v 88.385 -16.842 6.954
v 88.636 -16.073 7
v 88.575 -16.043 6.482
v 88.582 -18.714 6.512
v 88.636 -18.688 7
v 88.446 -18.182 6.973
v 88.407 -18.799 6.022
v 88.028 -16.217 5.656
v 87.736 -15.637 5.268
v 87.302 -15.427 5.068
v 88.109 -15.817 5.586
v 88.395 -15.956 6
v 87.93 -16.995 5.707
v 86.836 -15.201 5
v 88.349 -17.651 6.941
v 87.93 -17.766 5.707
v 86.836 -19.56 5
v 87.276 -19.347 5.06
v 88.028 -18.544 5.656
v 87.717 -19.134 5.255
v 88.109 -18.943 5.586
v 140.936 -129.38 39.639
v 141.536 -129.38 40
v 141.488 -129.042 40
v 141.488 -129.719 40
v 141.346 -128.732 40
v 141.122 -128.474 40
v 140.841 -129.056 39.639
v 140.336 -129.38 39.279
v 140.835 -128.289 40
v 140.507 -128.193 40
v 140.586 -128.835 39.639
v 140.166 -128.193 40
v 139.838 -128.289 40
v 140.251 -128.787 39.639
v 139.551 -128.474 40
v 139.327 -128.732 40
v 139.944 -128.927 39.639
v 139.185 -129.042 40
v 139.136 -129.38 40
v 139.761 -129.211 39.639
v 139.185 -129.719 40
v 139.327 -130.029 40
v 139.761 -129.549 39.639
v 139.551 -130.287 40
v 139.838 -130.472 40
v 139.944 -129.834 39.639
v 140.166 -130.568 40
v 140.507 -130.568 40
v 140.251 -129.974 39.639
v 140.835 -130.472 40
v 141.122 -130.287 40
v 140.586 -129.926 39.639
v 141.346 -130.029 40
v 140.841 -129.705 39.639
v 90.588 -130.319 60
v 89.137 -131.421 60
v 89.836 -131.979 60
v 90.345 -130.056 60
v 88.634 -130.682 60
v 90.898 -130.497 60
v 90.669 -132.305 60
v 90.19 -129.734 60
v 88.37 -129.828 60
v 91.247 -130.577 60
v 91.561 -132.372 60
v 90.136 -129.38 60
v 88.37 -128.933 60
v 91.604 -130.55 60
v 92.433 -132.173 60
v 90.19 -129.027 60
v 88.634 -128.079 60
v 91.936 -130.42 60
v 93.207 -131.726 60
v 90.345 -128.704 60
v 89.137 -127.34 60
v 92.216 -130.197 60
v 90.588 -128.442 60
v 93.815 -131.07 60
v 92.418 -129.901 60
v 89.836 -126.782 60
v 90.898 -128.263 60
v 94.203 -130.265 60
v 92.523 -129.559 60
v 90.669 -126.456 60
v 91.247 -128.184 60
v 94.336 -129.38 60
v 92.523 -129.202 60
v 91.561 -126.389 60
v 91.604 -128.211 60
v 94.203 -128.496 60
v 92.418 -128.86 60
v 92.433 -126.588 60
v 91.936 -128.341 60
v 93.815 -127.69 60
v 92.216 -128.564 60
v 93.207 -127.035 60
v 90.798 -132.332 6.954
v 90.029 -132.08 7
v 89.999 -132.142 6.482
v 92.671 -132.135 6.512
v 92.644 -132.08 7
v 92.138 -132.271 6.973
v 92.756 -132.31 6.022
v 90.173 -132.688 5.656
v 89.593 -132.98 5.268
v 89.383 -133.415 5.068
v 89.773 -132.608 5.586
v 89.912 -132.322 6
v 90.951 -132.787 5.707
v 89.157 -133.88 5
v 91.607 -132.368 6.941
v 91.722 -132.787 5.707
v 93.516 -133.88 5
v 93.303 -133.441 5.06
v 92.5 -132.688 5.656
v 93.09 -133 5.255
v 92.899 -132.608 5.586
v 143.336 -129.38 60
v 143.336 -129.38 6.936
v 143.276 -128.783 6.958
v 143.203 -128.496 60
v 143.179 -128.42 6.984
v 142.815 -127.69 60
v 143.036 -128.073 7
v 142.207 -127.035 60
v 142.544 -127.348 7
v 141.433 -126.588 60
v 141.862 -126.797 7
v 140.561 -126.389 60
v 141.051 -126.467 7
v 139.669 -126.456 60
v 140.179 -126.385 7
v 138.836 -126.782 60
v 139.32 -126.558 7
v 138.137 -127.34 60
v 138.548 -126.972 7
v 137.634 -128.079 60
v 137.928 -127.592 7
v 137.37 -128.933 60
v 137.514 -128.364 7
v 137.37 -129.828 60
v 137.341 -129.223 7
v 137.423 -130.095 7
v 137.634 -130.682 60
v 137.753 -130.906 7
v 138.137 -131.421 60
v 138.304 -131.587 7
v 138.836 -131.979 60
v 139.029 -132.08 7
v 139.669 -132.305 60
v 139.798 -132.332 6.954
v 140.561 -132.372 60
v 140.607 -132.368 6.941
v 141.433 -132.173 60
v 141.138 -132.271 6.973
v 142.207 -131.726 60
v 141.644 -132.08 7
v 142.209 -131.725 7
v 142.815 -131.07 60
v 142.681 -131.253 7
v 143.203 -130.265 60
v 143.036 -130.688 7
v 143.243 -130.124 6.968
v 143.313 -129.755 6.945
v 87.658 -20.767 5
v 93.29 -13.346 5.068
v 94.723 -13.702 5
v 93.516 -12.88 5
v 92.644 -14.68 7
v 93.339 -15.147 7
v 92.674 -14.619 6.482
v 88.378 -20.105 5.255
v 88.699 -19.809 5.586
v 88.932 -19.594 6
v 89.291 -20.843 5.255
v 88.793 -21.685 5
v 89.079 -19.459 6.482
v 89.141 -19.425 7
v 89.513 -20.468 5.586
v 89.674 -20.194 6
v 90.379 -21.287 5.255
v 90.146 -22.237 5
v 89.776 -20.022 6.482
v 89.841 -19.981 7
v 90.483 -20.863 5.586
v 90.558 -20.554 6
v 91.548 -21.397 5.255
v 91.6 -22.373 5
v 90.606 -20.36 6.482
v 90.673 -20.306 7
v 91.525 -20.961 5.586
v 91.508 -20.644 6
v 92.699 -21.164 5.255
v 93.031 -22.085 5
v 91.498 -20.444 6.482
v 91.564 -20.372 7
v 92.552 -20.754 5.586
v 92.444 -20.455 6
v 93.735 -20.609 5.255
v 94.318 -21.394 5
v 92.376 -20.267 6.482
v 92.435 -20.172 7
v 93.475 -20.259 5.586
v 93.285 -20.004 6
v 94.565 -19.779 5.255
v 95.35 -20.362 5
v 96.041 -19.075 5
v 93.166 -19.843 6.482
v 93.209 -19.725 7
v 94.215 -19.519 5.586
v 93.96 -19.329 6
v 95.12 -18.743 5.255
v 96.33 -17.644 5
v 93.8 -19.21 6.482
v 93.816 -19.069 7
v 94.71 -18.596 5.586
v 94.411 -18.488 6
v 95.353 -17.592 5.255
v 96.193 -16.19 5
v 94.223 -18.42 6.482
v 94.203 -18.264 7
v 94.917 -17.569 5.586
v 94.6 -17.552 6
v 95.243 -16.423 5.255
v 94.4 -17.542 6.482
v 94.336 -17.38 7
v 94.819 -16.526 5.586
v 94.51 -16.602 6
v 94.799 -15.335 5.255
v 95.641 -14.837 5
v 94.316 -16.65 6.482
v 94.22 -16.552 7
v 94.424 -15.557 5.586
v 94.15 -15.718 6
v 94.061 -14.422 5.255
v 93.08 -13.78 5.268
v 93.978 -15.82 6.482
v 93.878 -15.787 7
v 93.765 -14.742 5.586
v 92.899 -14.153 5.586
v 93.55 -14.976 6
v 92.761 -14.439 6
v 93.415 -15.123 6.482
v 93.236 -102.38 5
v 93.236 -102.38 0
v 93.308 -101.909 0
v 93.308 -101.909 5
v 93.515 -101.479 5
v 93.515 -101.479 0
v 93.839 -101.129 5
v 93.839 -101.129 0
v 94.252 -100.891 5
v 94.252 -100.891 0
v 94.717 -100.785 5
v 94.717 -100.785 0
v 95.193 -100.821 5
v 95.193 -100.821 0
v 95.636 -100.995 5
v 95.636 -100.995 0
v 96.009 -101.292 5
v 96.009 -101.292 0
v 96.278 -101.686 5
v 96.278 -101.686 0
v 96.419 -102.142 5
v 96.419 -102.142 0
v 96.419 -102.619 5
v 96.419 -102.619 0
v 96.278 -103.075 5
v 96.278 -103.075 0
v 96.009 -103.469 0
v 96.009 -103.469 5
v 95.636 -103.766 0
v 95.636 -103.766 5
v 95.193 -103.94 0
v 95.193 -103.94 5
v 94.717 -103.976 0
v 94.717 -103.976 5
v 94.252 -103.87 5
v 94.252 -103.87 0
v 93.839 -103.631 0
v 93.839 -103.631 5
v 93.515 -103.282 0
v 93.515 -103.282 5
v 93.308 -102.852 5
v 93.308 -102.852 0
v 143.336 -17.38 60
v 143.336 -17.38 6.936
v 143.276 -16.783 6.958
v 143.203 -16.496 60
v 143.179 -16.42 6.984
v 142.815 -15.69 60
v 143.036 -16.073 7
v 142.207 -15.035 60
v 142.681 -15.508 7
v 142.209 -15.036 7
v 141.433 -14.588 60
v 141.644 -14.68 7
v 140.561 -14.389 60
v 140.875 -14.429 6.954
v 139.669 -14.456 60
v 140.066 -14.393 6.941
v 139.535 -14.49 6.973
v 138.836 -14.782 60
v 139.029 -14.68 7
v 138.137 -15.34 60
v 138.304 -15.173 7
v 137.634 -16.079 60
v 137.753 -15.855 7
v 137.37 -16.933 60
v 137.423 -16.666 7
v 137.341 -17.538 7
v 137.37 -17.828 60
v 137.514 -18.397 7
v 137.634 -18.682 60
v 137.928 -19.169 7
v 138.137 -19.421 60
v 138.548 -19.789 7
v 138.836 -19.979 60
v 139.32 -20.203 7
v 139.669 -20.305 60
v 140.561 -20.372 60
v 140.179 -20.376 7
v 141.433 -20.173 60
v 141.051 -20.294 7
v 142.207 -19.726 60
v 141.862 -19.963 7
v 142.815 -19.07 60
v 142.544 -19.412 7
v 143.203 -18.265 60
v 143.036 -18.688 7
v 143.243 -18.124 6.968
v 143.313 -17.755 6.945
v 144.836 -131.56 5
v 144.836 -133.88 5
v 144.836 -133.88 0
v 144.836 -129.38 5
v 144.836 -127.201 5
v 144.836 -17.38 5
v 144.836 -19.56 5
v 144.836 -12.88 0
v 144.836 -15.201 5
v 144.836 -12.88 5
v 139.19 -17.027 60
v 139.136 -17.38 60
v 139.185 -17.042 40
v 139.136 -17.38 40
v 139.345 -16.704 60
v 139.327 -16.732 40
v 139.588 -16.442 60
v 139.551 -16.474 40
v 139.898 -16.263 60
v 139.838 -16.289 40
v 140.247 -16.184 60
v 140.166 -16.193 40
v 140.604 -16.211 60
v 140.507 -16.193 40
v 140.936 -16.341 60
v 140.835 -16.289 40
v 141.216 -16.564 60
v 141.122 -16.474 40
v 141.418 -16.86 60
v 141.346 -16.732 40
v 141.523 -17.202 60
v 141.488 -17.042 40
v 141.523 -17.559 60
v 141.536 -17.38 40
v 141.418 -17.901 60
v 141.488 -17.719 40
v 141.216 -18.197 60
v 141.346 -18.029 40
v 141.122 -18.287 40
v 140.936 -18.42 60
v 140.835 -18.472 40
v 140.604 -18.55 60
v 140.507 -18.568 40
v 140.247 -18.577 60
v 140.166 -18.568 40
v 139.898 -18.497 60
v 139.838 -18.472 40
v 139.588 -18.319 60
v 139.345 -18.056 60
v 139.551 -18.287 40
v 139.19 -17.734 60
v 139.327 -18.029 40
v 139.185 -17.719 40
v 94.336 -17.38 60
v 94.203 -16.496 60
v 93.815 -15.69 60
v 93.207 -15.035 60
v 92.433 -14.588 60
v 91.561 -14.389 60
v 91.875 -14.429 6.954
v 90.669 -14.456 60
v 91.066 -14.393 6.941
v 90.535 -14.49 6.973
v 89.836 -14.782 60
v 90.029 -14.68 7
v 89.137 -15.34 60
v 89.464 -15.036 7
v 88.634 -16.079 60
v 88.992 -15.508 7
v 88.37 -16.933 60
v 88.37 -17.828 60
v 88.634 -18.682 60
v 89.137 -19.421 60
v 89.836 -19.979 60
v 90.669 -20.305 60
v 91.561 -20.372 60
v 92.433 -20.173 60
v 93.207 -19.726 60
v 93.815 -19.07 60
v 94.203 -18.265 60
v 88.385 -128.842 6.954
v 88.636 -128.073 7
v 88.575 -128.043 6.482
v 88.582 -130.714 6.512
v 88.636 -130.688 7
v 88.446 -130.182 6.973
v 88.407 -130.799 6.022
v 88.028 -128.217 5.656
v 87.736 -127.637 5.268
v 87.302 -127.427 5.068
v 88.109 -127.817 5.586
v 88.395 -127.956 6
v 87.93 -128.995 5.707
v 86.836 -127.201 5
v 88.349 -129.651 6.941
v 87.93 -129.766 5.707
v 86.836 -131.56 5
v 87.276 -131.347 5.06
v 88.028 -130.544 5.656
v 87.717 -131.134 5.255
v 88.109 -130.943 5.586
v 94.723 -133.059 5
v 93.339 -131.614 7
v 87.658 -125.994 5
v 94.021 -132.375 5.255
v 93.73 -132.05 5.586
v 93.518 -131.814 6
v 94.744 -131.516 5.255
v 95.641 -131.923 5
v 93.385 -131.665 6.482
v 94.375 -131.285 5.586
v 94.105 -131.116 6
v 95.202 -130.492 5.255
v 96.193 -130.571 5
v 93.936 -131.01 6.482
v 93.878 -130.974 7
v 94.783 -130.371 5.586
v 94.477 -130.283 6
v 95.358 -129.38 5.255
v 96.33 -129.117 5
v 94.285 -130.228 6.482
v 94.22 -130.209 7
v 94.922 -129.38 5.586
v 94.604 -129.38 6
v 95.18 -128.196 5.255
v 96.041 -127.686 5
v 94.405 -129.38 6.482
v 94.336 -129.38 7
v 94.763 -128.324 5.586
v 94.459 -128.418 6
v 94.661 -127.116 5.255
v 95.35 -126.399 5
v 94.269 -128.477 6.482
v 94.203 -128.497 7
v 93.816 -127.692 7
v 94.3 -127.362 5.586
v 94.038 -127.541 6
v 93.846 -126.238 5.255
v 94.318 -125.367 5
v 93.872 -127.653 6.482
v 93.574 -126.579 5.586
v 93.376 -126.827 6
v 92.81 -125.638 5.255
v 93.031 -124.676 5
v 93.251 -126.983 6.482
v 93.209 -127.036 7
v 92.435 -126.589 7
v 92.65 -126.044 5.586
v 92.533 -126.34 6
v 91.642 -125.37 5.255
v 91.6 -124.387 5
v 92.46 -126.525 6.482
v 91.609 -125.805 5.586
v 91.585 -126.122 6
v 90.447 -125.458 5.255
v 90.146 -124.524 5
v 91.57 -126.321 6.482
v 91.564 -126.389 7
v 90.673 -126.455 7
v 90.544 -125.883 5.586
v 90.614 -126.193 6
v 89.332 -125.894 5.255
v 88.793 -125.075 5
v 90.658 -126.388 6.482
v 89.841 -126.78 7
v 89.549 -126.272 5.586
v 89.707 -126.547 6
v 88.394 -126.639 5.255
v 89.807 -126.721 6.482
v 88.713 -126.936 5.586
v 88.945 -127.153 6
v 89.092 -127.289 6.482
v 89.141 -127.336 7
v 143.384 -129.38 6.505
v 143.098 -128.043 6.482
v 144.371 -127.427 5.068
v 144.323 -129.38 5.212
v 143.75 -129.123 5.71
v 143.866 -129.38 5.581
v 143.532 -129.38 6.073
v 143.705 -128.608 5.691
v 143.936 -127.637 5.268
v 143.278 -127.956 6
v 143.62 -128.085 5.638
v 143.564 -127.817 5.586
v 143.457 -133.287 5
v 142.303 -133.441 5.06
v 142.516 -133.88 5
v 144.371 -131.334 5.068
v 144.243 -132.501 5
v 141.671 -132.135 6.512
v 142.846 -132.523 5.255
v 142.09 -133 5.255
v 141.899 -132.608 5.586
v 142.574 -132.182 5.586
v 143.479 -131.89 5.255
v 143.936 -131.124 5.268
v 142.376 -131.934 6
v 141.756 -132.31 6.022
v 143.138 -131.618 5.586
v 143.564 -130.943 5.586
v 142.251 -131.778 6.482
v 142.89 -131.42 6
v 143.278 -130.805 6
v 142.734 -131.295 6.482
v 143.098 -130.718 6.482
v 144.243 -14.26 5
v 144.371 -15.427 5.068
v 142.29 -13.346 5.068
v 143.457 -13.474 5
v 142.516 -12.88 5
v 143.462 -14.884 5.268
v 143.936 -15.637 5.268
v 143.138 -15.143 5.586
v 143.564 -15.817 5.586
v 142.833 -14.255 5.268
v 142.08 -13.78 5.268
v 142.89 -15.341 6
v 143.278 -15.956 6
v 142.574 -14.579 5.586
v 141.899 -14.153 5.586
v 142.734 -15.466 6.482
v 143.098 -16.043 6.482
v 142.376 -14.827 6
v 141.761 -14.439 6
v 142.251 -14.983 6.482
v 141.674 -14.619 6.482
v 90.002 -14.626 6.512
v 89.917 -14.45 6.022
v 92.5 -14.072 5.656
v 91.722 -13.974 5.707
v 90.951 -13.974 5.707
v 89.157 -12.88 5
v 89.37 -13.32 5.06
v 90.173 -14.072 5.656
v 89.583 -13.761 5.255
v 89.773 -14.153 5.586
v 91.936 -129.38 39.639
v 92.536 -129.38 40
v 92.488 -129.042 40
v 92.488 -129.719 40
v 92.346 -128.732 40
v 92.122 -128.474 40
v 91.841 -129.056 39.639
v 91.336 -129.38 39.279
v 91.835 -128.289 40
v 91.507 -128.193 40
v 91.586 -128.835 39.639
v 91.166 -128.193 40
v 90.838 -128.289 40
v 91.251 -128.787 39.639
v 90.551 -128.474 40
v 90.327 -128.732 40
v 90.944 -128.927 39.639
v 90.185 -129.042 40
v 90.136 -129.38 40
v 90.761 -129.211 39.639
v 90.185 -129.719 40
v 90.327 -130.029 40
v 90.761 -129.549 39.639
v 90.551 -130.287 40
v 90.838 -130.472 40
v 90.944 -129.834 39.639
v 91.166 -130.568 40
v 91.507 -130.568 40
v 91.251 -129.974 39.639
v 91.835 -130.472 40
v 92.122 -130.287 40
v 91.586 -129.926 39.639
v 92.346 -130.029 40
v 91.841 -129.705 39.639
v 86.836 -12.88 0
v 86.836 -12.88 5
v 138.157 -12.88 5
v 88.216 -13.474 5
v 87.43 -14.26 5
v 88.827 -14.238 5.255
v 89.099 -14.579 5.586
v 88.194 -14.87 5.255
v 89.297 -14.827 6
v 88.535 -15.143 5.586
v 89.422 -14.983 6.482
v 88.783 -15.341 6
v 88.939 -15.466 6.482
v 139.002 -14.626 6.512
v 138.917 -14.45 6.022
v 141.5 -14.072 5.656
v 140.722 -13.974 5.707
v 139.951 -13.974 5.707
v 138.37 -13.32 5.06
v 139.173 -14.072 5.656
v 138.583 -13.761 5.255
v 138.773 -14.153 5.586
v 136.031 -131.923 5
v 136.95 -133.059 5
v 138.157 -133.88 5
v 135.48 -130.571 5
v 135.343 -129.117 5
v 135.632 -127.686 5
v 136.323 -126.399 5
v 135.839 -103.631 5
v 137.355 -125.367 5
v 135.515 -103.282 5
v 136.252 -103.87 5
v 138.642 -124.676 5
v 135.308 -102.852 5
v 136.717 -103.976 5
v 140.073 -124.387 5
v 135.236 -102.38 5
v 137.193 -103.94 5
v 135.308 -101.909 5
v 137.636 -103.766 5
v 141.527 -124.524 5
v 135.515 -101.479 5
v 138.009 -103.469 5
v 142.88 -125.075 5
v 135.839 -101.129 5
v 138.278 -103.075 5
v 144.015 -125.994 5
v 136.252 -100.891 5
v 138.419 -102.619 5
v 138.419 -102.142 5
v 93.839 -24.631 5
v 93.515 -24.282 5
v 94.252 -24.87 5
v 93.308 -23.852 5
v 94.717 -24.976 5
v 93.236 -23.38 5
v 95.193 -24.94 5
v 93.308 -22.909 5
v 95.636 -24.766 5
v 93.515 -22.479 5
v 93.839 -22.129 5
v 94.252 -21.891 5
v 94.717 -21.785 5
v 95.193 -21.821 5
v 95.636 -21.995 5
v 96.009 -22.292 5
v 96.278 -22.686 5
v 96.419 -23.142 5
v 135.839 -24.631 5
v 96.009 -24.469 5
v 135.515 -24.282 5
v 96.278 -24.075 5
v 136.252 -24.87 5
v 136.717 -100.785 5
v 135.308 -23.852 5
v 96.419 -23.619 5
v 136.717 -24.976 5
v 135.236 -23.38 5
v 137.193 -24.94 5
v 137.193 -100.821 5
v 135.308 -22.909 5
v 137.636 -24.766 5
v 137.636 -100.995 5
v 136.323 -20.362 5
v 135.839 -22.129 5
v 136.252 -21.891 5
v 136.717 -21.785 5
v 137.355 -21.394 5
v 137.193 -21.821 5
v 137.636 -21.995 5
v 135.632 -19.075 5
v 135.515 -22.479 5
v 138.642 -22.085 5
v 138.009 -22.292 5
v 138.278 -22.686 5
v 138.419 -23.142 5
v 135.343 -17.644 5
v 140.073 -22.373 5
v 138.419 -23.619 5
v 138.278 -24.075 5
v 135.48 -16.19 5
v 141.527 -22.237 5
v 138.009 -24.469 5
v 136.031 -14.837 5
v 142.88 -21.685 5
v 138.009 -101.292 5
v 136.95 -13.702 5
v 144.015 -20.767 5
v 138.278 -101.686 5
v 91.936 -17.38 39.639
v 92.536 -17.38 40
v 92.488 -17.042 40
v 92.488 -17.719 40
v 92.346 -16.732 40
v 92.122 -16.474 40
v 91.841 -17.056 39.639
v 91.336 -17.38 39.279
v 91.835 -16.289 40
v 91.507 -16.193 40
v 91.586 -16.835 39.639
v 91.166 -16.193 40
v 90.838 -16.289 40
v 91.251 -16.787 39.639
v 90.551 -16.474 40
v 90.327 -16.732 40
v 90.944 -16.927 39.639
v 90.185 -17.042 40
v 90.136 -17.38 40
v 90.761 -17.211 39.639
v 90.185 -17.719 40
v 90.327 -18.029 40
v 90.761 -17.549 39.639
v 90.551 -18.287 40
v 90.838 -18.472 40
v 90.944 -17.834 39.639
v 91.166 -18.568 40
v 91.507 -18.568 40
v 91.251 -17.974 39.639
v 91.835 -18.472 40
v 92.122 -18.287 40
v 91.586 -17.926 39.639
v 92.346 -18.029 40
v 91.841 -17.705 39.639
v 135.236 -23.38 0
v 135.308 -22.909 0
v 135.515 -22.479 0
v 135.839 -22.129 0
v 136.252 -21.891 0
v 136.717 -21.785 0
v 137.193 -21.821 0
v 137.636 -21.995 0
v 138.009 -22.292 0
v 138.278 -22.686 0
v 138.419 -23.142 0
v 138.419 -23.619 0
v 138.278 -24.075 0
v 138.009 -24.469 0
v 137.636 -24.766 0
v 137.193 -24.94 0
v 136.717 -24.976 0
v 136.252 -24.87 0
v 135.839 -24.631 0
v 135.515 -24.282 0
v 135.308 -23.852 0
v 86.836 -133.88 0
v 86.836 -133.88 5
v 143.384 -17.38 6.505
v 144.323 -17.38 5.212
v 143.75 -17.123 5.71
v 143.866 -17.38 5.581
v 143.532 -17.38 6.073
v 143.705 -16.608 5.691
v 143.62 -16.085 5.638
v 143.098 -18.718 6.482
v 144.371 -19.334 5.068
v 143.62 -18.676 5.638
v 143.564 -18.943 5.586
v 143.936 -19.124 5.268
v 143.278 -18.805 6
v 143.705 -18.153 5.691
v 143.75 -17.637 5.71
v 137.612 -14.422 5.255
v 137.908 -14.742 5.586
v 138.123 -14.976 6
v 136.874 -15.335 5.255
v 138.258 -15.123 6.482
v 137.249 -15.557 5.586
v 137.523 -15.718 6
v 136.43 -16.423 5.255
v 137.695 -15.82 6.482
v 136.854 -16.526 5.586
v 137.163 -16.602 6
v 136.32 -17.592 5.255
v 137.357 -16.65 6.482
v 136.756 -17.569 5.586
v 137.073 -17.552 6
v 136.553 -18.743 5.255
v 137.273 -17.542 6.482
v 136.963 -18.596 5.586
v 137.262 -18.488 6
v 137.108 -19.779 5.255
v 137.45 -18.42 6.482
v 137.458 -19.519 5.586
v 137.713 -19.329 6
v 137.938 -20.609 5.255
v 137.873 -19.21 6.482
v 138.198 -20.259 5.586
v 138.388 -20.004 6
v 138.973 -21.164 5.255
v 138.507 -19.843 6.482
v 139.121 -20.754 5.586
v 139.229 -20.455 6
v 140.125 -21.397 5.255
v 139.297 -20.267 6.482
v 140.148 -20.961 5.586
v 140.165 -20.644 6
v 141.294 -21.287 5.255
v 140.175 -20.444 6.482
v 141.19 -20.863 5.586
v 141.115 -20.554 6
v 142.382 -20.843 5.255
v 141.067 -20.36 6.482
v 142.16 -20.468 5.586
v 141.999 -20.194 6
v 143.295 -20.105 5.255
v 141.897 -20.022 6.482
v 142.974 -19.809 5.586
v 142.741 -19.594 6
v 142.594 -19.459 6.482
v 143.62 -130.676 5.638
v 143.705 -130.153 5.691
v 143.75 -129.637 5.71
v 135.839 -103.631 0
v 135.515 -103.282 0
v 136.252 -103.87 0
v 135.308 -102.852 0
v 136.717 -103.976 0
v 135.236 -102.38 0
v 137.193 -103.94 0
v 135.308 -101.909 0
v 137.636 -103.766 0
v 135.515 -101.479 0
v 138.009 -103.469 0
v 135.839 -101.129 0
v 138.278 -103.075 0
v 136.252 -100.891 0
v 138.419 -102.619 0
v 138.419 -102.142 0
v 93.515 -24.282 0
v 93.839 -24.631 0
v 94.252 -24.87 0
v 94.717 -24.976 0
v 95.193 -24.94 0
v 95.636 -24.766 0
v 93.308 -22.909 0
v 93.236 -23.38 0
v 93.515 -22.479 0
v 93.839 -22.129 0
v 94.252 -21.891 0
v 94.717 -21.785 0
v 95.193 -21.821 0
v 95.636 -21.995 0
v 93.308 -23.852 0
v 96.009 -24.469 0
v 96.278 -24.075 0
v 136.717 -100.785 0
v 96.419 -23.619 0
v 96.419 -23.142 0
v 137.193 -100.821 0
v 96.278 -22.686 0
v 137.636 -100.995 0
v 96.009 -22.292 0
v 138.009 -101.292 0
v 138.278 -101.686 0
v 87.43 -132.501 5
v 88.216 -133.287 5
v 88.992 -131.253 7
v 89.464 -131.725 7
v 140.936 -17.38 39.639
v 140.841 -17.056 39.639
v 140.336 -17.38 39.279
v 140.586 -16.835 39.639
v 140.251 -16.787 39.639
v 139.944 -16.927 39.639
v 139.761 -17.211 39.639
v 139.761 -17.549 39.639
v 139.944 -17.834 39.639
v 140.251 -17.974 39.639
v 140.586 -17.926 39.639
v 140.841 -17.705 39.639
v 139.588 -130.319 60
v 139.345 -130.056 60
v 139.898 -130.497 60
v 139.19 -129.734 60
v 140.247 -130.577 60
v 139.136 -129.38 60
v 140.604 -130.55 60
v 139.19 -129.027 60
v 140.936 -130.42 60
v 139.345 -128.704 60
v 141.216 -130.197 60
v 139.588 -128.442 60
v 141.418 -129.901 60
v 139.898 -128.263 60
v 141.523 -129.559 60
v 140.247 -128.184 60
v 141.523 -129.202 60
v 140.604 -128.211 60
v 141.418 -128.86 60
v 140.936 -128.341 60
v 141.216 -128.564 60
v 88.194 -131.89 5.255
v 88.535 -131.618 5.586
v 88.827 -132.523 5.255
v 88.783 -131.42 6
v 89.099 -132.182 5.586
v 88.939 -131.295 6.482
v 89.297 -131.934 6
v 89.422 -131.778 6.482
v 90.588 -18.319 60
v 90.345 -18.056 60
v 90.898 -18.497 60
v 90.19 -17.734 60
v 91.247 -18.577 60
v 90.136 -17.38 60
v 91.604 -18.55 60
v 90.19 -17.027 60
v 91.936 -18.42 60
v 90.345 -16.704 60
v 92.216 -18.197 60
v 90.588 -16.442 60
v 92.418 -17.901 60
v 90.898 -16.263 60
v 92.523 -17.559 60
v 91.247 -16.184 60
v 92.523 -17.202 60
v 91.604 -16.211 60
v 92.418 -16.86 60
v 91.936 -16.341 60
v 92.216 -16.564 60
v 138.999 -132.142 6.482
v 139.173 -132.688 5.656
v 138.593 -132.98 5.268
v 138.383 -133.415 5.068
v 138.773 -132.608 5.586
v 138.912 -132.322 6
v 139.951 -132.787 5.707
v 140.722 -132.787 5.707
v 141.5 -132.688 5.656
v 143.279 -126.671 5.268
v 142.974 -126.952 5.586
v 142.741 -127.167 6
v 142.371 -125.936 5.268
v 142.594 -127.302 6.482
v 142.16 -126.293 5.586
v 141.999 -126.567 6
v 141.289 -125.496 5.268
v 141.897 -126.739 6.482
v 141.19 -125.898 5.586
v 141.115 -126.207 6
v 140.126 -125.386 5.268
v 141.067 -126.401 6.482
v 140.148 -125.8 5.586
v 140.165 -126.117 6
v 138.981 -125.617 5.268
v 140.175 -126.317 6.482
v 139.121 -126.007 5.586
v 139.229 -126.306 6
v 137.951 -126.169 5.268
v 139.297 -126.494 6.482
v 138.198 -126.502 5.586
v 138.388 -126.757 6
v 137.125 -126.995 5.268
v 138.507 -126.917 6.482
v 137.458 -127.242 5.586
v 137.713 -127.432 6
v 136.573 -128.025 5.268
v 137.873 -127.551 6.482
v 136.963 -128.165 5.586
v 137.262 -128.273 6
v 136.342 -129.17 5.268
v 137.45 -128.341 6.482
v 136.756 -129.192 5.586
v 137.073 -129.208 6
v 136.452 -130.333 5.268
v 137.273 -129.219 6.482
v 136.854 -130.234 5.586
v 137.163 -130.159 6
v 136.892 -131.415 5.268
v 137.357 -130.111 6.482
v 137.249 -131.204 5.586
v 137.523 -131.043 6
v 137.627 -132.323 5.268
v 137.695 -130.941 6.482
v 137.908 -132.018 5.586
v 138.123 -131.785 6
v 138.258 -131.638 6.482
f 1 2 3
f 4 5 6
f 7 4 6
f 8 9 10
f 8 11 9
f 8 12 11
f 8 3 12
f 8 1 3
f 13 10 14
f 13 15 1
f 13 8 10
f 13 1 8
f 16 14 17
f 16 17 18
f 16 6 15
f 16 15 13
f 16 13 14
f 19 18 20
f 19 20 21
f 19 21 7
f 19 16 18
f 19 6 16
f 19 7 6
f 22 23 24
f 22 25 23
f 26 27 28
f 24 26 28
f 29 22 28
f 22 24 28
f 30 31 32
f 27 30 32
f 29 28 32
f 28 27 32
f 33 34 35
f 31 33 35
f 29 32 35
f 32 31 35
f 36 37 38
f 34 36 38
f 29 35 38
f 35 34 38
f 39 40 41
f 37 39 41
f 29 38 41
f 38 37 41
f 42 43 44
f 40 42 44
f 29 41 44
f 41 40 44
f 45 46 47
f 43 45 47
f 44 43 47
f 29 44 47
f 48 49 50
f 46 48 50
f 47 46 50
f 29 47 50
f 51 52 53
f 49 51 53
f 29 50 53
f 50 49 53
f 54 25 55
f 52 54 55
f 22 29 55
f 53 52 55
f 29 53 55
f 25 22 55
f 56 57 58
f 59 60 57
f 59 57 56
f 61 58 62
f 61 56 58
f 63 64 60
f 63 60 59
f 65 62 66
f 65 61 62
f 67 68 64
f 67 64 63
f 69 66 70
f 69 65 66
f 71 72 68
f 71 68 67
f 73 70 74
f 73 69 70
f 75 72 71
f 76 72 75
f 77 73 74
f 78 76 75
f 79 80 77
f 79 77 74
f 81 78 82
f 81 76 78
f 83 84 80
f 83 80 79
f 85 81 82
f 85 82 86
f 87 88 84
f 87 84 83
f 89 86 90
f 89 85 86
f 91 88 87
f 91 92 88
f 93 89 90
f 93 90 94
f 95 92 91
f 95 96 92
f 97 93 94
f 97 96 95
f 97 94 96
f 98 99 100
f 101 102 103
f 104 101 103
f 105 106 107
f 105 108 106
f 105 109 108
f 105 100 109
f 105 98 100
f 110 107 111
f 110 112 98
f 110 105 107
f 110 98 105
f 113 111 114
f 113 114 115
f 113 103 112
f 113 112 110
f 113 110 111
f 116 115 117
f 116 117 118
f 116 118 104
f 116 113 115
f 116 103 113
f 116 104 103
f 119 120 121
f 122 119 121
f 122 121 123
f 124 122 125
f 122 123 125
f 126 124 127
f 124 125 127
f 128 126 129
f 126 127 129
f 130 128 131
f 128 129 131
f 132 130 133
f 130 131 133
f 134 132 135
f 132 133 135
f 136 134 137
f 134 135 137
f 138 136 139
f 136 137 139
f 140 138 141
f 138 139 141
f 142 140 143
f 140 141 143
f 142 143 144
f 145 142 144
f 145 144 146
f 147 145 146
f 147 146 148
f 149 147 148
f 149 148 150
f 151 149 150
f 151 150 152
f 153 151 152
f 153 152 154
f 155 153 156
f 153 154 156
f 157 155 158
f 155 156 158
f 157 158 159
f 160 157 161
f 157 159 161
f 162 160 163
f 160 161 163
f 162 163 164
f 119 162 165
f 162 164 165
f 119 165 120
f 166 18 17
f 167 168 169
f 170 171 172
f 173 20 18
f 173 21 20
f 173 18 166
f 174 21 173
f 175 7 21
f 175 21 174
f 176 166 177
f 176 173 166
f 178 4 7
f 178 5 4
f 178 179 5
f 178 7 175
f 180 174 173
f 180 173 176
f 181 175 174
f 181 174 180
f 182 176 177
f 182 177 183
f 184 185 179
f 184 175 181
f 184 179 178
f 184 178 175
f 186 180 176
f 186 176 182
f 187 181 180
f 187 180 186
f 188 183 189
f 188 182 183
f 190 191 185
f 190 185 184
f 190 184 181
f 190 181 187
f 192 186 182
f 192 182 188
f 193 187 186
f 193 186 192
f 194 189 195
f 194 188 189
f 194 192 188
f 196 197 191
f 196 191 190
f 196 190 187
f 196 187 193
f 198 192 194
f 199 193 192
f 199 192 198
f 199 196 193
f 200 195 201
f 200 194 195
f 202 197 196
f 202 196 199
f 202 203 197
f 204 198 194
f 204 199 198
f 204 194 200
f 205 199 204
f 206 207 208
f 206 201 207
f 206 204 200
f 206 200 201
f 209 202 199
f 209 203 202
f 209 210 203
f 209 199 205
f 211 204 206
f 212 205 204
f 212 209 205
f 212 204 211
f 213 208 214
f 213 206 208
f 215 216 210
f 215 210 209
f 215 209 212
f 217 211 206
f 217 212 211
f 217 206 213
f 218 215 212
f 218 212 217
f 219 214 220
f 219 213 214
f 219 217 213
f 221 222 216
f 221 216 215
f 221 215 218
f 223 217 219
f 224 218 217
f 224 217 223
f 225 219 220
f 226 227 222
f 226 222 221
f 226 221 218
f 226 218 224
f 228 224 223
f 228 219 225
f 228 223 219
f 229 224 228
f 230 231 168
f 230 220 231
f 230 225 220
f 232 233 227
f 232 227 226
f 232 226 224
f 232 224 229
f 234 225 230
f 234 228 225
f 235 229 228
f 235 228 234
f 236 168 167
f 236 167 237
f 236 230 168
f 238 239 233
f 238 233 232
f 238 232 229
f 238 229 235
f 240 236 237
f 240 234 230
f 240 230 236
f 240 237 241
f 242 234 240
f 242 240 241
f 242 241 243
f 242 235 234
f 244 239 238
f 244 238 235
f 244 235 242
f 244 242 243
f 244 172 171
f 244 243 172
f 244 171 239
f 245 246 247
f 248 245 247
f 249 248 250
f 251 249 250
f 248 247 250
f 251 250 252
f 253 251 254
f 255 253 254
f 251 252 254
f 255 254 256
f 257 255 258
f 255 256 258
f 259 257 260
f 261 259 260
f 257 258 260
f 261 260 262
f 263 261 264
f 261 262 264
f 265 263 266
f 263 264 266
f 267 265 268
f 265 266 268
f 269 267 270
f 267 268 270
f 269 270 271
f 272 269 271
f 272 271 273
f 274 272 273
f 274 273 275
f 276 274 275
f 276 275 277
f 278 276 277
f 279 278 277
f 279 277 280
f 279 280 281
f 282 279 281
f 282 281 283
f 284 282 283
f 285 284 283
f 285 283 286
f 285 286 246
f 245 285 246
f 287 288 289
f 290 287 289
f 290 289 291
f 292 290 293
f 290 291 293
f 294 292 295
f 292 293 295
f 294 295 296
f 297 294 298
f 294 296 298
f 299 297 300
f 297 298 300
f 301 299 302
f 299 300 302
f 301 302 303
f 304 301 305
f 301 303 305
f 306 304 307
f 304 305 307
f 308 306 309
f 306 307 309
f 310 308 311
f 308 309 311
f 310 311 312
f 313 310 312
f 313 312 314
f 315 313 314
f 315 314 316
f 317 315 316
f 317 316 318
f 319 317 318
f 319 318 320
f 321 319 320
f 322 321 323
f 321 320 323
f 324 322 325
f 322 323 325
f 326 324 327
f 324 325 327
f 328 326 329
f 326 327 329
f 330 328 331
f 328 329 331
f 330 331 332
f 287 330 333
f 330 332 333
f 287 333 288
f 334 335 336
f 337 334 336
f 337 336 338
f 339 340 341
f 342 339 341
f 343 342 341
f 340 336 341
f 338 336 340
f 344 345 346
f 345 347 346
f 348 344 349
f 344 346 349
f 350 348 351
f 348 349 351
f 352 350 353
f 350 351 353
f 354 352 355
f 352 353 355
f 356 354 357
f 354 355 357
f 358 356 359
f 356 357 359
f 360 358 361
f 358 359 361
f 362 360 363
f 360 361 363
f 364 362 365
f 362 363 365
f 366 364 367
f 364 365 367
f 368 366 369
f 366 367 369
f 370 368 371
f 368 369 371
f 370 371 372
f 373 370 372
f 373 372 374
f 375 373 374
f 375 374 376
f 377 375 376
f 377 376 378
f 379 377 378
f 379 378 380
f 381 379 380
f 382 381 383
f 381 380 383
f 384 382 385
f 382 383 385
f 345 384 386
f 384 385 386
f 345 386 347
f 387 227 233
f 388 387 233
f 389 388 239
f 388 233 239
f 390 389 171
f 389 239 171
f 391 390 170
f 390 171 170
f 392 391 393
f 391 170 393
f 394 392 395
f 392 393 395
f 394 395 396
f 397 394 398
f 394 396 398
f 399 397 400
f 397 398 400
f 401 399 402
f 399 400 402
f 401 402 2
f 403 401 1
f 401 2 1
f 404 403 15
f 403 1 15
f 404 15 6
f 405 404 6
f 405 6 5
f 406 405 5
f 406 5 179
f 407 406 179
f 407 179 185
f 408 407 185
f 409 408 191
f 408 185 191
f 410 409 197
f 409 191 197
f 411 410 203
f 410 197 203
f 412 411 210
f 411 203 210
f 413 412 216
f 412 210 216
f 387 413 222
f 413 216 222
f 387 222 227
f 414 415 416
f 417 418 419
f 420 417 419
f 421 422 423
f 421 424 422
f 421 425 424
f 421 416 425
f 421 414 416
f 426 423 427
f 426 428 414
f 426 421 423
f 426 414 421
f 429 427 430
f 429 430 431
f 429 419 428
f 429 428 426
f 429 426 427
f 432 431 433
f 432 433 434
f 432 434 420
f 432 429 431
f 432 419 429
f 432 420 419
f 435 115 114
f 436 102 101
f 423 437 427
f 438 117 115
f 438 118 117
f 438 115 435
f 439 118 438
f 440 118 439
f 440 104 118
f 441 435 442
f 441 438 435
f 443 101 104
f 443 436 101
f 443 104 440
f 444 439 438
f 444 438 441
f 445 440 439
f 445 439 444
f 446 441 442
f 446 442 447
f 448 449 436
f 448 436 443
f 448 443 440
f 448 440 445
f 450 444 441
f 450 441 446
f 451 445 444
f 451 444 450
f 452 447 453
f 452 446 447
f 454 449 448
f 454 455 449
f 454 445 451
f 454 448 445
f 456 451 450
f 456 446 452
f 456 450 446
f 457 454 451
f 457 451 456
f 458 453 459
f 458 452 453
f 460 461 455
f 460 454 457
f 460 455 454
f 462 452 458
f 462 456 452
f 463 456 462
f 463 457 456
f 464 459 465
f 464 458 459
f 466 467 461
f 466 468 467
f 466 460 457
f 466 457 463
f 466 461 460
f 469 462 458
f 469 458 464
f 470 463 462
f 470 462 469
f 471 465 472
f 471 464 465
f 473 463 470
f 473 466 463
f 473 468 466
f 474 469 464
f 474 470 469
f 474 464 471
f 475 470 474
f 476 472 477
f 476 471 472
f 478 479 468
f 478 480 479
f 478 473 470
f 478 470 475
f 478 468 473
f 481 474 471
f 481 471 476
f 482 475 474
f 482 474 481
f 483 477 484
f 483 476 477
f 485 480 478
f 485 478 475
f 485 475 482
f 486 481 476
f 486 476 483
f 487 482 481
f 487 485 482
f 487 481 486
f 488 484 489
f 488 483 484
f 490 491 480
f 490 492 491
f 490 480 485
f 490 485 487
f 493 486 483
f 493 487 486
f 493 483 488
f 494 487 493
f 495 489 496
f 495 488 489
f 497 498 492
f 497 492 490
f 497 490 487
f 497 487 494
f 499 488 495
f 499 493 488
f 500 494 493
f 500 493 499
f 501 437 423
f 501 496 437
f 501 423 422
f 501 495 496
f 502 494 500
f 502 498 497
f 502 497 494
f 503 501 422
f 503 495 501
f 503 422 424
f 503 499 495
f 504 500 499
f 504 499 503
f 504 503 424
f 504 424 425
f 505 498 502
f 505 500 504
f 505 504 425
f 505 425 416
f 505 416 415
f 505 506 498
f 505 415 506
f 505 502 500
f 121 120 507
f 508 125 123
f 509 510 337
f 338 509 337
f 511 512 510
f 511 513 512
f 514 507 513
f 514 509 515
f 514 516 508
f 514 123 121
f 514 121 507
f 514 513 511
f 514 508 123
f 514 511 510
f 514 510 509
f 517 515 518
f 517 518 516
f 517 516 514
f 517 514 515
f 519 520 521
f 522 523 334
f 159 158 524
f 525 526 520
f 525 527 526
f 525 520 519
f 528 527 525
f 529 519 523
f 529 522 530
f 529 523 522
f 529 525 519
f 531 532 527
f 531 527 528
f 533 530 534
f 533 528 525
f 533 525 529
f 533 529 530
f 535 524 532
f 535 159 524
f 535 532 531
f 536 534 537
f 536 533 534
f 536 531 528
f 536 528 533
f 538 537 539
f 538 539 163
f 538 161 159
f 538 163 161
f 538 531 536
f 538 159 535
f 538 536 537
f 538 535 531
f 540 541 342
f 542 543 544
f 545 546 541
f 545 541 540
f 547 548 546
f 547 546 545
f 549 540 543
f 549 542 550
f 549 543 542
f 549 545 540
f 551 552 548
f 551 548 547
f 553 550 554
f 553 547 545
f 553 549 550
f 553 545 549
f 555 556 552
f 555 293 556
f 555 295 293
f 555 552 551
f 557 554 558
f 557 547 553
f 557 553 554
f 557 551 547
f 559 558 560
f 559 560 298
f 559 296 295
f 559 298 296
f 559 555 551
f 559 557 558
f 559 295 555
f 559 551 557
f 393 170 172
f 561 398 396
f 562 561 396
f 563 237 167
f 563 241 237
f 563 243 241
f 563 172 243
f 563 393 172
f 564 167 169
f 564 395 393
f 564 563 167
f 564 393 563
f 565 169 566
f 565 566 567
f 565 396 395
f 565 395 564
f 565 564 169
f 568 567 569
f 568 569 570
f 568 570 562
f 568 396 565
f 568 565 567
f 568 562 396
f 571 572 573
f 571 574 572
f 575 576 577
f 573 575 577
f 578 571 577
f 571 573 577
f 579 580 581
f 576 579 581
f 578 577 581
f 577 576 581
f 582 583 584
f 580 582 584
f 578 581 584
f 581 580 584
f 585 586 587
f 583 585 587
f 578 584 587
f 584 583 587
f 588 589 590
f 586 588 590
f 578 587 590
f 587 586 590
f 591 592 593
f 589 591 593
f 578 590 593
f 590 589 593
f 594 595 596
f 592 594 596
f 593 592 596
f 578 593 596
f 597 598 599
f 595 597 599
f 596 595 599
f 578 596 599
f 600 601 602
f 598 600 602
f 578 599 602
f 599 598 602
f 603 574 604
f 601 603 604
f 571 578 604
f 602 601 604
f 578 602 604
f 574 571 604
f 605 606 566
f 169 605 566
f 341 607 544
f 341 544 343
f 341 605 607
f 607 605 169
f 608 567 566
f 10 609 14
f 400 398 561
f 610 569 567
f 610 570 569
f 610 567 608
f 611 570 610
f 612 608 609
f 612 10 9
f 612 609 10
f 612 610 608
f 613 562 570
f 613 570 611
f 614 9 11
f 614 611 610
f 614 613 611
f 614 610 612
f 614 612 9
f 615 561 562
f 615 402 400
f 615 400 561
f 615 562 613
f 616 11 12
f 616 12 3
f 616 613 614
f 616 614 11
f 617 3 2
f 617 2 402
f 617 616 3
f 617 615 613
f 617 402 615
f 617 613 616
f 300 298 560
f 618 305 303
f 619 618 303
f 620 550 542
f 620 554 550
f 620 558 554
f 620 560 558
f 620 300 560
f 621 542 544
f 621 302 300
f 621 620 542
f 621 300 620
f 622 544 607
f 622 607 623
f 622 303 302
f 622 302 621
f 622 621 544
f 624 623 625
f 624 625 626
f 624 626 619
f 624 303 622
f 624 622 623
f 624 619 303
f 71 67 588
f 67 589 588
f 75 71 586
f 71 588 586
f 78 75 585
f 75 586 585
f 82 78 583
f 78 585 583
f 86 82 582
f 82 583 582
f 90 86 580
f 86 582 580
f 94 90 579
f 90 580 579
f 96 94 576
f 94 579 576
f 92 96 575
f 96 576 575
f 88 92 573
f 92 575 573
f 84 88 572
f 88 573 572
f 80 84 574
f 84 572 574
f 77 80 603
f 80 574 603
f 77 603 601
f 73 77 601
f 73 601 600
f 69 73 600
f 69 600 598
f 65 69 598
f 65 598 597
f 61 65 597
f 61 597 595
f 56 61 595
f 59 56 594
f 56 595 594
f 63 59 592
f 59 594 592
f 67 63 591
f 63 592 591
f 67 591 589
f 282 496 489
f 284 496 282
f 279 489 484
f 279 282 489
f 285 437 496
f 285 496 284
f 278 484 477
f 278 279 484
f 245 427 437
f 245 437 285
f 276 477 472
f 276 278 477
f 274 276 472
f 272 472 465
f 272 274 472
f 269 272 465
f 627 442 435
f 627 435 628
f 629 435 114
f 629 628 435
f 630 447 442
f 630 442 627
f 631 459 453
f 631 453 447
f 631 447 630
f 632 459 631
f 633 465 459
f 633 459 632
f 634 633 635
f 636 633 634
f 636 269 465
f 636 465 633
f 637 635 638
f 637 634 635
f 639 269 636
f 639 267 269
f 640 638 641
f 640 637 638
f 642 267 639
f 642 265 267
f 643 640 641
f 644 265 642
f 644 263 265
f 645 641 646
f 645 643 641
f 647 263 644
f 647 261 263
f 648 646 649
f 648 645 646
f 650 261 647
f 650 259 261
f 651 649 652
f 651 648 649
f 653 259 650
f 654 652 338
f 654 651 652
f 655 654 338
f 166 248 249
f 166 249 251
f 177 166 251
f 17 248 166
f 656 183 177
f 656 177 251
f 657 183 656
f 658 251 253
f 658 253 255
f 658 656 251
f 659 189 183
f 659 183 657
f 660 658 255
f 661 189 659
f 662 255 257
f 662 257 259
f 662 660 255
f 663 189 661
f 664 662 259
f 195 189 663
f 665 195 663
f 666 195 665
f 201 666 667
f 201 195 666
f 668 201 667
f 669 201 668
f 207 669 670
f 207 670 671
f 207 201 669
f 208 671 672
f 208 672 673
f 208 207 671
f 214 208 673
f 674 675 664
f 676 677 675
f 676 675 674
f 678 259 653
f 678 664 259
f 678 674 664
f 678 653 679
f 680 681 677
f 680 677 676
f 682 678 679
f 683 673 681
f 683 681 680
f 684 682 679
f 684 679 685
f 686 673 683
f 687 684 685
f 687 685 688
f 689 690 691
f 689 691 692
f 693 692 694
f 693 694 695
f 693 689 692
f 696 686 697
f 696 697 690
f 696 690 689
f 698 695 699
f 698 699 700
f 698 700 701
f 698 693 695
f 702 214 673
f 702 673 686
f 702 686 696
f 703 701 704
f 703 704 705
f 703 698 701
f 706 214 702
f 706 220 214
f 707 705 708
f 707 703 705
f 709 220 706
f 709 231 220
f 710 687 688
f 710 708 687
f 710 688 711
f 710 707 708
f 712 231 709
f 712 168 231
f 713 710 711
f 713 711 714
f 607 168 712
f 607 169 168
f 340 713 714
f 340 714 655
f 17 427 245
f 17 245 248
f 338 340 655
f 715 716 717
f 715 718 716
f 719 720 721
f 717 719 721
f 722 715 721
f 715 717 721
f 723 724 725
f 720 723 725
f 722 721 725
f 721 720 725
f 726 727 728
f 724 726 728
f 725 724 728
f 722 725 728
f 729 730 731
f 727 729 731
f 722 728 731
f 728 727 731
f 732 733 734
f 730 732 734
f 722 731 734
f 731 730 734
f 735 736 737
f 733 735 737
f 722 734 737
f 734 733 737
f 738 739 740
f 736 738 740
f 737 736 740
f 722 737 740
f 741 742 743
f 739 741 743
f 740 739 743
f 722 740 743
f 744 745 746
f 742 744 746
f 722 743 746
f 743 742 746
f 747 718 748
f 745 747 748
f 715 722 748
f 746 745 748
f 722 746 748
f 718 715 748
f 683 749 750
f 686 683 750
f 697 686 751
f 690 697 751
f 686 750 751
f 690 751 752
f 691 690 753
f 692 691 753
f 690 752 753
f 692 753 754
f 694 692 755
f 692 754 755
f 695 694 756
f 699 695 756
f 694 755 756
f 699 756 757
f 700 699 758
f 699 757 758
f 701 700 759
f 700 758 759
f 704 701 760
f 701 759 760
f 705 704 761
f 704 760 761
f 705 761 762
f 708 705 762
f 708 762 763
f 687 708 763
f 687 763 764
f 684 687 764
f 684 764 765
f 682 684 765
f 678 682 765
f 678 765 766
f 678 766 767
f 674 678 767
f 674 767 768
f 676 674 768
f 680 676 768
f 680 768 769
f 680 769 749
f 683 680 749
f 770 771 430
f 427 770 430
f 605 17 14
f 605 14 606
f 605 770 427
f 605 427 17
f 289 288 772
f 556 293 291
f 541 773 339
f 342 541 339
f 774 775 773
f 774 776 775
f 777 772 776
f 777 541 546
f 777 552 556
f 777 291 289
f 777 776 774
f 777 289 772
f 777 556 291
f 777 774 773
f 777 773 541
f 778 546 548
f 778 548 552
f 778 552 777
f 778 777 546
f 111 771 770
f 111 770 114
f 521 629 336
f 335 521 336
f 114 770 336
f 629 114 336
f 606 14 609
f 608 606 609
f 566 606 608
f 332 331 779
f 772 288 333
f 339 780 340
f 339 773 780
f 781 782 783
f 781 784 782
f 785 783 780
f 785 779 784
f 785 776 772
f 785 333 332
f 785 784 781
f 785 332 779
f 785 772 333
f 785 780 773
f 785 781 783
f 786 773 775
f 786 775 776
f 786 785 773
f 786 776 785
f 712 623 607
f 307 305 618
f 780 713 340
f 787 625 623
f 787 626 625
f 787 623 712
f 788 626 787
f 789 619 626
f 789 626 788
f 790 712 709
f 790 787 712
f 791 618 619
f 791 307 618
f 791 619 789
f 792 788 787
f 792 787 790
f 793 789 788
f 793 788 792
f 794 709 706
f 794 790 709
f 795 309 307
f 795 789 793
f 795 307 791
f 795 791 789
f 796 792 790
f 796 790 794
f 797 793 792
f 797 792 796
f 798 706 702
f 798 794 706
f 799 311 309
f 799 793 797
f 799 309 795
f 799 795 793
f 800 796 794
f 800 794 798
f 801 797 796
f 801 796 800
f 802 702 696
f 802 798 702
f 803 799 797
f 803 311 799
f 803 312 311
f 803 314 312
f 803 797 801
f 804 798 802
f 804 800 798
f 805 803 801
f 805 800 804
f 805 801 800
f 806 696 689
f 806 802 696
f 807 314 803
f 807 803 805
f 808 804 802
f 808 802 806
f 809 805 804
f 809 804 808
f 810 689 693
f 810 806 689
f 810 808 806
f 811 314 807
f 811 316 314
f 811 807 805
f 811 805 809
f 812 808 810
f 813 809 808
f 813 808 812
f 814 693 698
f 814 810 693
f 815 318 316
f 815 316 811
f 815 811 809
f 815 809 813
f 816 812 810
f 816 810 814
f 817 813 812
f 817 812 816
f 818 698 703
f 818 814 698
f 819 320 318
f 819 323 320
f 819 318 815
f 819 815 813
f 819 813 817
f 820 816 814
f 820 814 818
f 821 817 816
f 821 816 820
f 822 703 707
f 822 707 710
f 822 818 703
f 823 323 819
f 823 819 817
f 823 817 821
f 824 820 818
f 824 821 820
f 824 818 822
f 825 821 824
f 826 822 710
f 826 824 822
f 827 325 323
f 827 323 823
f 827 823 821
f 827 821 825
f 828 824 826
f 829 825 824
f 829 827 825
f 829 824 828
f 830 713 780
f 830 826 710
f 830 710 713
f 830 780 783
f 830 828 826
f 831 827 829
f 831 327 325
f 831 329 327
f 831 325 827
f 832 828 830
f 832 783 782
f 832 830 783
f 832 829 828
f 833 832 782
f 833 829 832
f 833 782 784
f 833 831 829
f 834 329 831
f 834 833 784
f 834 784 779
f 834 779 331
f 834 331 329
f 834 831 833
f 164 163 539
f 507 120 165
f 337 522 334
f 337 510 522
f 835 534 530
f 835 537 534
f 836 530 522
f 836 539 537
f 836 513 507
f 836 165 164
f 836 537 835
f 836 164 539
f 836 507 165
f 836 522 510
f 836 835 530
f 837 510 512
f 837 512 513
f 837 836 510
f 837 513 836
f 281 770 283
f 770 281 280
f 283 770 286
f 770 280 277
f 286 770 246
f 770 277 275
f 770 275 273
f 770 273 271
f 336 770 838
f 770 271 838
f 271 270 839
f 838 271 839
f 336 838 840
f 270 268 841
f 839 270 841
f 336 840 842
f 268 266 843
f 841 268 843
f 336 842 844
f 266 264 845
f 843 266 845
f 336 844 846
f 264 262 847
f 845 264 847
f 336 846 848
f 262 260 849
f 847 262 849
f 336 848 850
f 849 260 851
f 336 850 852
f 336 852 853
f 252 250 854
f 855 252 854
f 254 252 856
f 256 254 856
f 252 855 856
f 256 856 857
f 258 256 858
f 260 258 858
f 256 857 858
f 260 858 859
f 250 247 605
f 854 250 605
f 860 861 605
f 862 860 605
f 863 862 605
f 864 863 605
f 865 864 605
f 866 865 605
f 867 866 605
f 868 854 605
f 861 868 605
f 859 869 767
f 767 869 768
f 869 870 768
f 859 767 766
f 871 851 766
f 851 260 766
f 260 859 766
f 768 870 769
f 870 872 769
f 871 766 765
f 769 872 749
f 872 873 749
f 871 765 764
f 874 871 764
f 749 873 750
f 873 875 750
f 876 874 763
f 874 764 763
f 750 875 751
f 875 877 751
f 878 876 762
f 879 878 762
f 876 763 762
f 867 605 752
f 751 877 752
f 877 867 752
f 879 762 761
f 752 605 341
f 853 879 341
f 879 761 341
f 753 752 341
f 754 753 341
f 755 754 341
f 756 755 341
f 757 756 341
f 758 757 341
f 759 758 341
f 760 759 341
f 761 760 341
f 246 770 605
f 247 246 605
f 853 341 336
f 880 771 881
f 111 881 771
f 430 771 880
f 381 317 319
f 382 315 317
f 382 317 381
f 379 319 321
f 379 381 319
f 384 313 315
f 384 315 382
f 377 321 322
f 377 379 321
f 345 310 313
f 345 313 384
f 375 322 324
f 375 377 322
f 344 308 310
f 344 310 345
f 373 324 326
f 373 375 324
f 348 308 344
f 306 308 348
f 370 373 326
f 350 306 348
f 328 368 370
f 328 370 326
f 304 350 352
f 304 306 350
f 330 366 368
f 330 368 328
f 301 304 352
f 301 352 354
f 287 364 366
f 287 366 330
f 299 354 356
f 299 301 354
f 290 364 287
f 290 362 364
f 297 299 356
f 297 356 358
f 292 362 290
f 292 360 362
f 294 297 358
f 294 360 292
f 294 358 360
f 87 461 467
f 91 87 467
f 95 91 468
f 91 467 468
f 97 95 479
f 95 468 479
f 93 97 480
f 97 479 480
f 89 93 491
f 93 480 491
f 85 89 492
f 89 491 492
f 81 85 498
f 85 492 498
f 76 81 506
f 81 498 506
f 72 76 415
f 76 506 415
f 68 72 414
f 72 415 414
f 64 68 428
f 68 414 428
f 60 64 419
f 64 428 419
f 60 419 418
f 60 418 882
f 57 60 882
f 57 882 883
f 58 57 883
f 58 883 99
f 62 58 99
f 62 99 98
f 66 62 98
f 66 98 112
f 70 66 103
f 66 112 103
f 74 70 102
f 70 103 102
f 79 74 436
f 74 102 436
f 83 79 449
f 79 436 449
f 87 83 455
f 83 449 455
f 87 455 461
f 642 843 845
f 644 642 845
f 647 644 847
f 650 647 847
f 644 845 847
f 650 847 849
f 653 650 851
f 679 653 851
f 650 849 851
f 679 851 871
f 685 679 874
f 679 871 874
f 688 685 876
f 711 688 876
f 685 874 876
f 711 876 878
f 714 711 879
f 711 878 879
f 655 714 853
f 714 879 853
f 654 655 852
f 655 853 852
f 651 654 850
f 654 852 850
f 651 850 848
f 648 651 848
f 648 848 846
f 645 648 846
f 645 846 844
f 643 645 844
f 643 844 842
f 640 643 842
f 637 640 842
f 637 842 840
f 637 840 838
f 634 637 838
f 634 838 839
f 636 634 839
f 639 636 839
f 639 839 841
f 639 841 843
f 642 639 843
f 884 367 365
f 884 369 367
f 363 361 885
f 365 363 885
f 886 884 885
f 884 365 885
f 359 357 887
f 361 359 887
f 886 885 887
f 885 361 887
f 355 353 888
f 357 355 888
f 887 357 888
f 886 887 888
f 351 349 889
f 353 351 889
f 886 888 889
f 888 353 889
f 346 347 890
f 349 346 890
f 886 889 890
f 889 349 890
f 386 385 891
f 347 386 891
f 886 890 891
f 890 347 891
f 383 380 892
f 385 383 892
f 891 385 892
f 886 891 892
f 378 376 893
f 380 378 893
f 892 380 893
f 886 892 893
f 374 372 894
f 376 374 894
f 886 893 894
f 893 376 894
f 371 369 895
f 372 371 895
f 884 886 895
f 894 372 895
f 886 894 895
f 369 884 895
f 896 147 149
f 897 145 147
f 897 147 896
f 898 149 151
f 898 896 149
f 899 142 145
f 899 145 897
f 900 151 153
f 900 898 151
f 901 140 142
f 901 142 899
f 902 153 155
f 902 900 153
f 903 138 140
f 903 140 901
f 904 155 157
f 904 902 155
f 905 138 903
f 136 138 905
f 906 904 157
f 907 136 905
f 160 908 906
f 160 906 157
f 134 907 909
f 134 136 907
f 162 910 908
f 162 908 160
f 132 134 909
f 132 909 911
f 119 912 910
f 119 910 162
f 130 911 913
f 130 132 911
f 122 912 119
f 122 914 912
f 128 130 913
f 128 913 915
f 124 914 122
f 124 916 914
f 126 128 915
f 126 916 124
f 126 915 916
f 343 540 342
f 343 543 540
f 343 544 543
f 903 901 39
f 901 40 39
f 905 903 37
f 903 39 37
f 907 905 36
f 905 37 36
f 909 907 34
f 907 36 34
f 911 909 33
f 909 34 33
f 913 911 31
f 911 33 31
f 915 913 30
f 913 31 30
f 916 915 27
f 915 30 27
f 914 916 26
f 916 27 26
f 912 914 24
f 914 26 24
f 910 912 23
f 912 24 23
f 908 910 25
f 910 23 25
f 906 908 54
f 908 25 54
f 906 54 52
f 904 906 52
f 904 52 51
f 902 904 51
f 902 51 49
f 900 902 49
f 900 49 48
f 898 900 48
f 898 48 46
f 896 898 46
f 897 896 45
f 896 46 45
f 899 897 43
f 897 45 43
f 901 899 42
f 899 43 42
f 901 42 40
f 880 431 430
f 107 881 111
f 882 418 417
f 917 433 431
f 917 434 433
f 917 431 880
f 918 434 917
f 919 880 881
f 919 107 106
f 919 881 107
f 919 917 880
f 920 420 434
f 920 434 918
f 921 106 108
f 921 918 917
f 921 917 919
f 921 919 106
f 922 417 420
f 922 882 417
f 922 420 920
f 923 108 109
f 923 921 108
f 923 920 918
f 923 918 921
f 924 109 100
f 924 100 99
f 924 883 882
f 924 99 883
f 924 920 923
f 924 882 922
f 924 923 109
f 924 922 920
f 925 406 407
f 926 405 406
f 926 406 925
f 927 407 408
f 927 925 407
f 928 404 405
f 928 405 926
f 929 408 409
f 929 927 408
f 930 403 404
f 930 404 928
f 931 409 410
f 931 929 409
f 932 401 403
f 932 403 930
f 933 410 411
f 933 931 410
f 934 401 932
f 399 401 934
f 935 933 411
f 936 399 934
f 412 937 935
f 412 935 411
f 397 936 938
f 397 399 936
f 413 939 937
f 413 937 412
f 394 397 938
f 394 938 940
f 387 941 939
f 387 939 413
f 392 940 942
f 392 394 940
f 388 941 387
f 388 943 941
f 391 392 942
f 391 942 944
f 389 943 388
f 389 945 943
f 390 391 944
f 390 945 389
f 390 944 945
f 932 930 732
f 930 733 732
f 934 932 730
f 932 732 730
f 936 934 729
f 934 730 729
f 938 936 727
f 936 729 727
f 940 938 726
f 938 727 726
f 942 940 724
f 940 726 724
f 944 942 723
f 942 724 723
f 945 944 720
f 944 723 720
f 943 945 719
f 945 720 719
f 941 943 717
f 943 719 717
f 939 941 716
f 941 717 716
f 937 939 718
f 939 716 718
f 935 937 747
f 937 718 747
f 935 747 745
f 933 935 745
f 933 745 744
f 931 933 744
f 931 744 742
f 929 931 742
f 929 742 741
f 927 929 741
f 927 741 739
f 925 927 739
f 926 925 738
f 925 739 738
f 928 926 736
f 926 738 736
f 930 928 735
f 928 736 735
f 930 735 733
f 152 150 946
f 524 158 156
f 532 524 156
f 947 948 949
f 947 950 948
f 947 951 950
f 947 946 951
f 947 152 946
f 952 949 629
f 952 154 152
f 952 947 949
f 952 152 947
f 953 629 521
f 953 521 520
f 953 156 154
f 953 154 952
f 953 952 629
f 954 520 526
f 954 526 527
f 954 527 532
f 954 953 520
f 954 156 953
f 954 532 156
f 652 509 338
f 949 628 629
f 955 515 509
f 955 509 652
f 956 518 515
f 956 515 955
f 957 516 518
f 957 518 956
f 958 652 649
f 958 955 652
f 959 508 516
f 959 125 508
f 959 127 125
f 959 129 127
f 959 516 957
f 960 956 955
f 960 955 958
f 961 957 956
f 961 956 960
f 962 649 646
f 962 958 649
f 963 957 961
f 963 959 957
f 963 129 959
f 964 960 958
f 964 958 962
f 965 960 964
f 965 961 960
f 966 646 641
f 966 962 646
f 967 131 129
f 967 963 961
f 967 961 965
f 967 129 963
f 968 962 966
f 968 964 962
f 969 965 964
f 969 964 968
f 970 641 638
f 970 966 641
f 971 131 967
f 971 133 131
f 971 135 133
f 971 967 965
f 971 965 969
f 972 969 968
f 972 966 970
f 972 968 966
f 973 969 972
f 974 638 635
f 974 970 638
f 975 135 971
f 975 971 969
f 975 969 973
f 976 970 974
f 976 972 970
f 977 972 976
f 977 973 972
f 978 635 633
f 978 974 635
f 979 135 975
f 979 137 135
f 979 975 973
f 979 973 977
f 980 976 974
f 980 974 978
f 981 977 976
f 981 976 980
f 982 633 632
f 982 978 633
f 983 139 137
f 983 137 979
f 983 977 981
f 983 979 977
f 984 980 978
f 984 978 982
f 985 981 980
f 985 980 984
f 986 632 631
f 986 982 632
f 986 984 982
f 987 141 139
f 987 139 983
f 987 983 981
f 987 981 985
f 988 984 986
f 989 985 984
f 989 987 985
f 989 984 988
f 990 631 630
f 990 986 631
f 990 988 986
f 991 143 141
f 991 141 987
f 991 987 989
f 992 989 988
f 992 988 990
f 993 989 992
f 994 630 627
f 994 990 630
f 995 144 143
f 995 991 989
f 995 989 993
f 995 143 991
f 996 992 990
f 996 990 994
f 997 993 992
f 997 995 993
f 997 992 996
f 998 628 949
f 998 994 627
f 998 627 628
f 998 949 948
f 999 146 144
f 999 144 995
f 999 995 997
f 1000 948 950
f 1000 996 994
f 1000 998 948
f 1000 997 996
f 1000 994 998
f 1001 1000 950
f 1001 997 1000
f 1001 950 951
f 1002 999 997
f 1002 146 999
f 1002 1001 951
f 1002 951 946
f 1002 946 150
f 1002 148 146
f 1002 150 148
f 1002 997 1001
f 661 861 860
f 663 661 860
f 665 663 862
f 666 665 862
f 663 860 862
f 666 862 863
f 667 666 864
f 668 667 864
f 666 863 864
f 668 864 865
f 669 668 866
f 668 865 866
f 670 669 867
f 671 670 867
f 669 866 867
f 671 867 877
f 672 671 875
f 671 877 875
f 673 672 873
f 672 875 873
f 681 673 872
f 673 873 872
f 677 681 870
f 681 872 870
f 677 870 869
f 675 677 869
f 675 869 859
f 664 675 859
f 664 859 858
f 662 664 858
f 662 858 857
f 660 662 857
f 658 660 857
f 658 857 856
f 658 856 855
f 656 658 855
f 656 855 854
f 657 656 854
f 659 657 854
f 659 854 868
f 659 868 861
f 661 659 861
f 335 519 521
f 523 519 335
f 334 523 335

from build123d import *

# Parameters (mm, degrees)
SCHIZZO1_W                   = 58
SCHIZZO1_H                   = 121
ESTRUSIONE_ESTRUSIONE2_DEPTH = 5
TAGLIO_ESTRUSIONE1_REACH     = 7
SCHIZZO12_R                  = 1.6
SCHIZZO2_R                   = 3
ESTRUSIONE_ESTRUSIONE3_DEPTH = 55
RACCORDO1_R                  = 2
FORO_PER_VITE_M3_1_D         = 2.4
FORO_PER_VITE_M3_1_DEPTH     = 20
FORO_PER_VITE_M3_1_TIP       = 0.721032743


with BuildPart() as part:
    # Schizzo1 → Estrusione-Estrusione2 (new body)
    with BuildSketch(Plane.XY):
        with Locations((115.836484846, -73.380424615)):
            Rectangle(SCHIZZO1_W, SCHIZZO1_H)
    extrude(amount=ESTRUSIONE_ESTRUSIONE2_DEPTH)

    # Schizzo12 → Taglio-Estrusione1 (cut, up to next)
    with BuildSketch(Plane(origin=(0, 0, 0), x_dir=(-1, 0, 0), z_dir=(0, 0, -1)), mode=Mode.PRIVATE) as taglio_estrusione1_sk1:
        with Locations((-94.836484846, -102.380424615)):
            Circle(SCHIZZO12_R)
    taglio_estrusione1_tool1 = extrude(taglio_estrusione1_sk1.sketch, amount=-TAGLIO_ESTRUSIONE1_REACH, mode=Mode.PRIVATE) & part.part
    add(taglio_estrusione1_tool1.solids().sort_by_distance((94.836485, -102.380425, 0))[0], mode=Mode.SUBTRACT)
    # Schizzo12 → Taglio-Estrusione1 (cut, up to next)
    with BuildSketch(Plane(origin=(0, 0, 0), x_dir=(-1, 0, 0), z_dir=(0, 0, -1)), mode=Mode.PRIVATE) as taglio_estrusione1_sk2:
        with Locations((-136.836484846, -102.380424615)):
            Circle(SCHIZZO12_R)
    taglio_estrusione1_tool2 = extrude(taglio_estrusione1_sk2.sketch, amount=-TAGLIO_ESTRUSIONE1_REACH, mode=Mode.PRIVATE) & part.part
    add(taglio_estrusione1_tool2.solids().sort_by_distance((136.836485, -102.380425, 0))[0], mode=Mode.SUBTRACT)
    # Schizzo12 → Taglio-Estrusione1 (cut, up to next)
    with BuildSketch(Plane(origin=(0, 0, 0), x_dir=(-1, 0, 0), z_dir=(0, 0, -1)), mode=Mode.PRIVATE) as taglio_estrusione1_sk3:
        with Locations((-136.836484846, -23.380424615)):
            Circle(SCHIZZO12_R)
    taglio_estrusione1_tool3 = extrude(taglio_estrusione1_sk3.sketch, amount=-TAGLIO_ESTRUSIONE1_REACH, mode=Mode.PRIVATE) & part.part
    add(taglio_estrusione1_tool3.solids().sort_by_distance((136.836485, -23.380425, 0))[0], mode=Mode.SUBTRACT)
    # Schizzo12 → Taglio-Estrusione1 (cut, up to next)
    with BuildSketch(Plane(origin=(0, 0, 0), x_dir=(-1, 0, 0), z_dir=(0, 0, -1)), mode=Mode.PRIVATE) as taglio_estrusione1_sk4:
        with Locations((-94.836484846, -23.380424615)):
            Circle(SCHIZZO12_R)
    taglio_estrusione1_tool4 = extrude(taglio_estrusione1_sk4.sketch, amount=-TAGLIO_ESTRUSIONE1_REACH, mode=Mode.PRIVATE) & part.part
    add(taglio_estrusione1_tool4.solids().sort_by_distance((94.836485, -23.380425, 0))[0], mode=Mode.SUBTRACT)

    # Schizzo2 → Estrusione-Estrusione3 (add)
    with BuildSketch(Plane.XY.offset(5)):
        with Locations((140.336484846, -129.380424615)):
            Circle(SCHIZZO2_R)
        with Locations((91.336484846, -129.380424615)):
            Circle(SCHIZZO2_R)
        with Locations((140.336484846, -17.380424615)):
            Circle(SCHIZZO2_R)
        with Locations((91.336484846, -17.380424615)):
            Circle(SCHIZZO2_R)
    extrude(amount=ESTRUSIONE_ESTRUSIONE3_DEPTH)

    # Raccordo1
    raccordo1_edges = [part.edges().sort_by_distance(p)[0] for p in [
        (88.336484846, -129.380424615, 5),
        (137.336484846, -17.380424615, 5),
        (137.336484846, -129.380424615, 5),
        (88.336484846, -17.380424615, 5),
    ]]
    fillet(raccordo1_edges, radius=RACCORDO1_R)

    # Foro per Vite M3-1
    with Locations(Plane.XY.offset(60)):
        with Locations((140.336484846, -129.380424615), (91.336484846, -129.380424615), (91.336484846, -17.380424615), (140.336484846, -17.380424615)):
            Hole(FORO_PER_VITE_M3_1_D / 2, depth=FORO_PER_VITE_M3_1_DEPTH)
            with Locations((0, 0, -(FORO_PER_VITE_M3_1_DEPTH + FORO_PER_VITE_M3_1_TIP / 2))):  # 118° drill point
                Cone(0, FORO_PER_VITE_M3_1_D / 2, FORO_PER_VITE_M3_1_TIP, mode=Mode.SUBTRACT)


solid = part.part
